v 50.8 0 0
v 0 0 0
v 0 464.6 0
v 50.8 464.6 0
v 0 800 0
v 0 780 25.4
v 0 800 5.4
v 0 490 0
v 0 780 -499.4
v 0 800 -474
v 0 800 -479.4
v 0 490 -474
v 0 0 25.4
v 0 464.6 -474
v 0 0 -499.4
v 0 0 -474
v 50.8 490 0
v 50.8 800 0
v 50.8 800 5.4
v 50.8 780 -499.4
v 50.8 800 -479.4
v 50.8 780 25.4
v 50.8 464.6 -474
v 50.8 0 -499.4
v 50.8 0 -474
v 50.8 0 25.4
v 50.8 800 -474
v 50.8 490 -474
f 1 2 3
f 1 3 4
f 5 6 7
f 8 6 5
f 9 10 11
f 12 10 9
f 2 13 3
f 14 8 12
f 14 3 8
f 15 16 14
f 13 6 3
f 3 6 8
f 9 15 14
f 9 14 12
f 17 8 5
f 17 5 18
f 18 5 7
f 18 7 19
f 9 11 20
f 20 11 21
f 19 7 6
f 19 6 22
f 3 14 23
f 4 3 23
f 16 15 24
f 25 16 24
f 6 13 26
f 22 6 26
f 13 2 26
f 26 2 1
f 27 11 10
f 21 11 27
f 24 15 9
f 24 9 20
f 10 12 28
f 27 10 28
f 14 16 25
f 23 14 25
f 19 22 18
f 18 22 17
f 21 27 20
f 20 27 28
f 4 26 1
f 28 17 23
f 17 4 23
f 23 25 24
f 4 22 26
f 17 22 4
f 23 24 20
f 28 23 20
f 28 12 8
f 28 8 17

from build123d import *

# Parameters (mm, degrees)
CROQUIS2_W                = 50.8
CROQUIS2_H                = 25.4
SALIENTE_EXTRUIR1_DEPTH   = 800
SALIENTE_EXTRUIR1_2_DEPTH = 800
CROQUIS3_W                = 50.8
CROQUIS3_H                = 25.4
SALIENTE_EXTRUIR2_DEPTH   = 474
CHAFL_N1_SIZE             = 20


with BuildPart() as part:
    # Croquis2 → Saliente-Extruir1 (new body)
    with BuildSketch(Plane(origin=(0, 0, 0), x_dir=(1, 0, 0), z_dir=(0, 1, 0))):
        with Locations((25.4, -12.7)):
            Rectangle(CROQUIS2_W, CROQUIS2_H)
    extrude(amount=SALIENTE_EXTRUIR1_DEPTH)



with BuildPart() as body_2:
    # Croquis2 → Saliente-Extruir1 2 (new body)
    with BuildSketch(Plane(origin=(0, 0, 0), x_dir=(1, 0, 0), z_dir=(0, 1, 0))):
        with Locations((25.4, 486.7)):
            Rectangle(CROQUIS2_W, CROQUIS2_H)
    extrude(amount=SALIENTE_EXTRUIR1_2_DEPTH)


with BuildPart() as part_1:
    add(part.part)

    add(body_2.part)  # Saliente-Extruir2 merges body 2
    # Croquis3 → Saliente-Extruir2 (add)
    with BuildSketch(Plane.XY.offset(-474)):
        with Locations((25.4, 477.3)):
            Rectangle(CROQUIS3_W, CROQUIS3_H)
    extrude(amount=SALIENTE_EXTRUIR2_DEPTH)

    # Chaflán1
    chafl_n1_edges = [part_1.edges().sort_by_distance(p)[0] for p in [
        (25.4, 800, 25.4),
        (25.4, 800, -499.4),
    ]]
    chamfer(chafl_n1_edges, length=CHAFL_N1_SIZE)


solid = part_1.part
